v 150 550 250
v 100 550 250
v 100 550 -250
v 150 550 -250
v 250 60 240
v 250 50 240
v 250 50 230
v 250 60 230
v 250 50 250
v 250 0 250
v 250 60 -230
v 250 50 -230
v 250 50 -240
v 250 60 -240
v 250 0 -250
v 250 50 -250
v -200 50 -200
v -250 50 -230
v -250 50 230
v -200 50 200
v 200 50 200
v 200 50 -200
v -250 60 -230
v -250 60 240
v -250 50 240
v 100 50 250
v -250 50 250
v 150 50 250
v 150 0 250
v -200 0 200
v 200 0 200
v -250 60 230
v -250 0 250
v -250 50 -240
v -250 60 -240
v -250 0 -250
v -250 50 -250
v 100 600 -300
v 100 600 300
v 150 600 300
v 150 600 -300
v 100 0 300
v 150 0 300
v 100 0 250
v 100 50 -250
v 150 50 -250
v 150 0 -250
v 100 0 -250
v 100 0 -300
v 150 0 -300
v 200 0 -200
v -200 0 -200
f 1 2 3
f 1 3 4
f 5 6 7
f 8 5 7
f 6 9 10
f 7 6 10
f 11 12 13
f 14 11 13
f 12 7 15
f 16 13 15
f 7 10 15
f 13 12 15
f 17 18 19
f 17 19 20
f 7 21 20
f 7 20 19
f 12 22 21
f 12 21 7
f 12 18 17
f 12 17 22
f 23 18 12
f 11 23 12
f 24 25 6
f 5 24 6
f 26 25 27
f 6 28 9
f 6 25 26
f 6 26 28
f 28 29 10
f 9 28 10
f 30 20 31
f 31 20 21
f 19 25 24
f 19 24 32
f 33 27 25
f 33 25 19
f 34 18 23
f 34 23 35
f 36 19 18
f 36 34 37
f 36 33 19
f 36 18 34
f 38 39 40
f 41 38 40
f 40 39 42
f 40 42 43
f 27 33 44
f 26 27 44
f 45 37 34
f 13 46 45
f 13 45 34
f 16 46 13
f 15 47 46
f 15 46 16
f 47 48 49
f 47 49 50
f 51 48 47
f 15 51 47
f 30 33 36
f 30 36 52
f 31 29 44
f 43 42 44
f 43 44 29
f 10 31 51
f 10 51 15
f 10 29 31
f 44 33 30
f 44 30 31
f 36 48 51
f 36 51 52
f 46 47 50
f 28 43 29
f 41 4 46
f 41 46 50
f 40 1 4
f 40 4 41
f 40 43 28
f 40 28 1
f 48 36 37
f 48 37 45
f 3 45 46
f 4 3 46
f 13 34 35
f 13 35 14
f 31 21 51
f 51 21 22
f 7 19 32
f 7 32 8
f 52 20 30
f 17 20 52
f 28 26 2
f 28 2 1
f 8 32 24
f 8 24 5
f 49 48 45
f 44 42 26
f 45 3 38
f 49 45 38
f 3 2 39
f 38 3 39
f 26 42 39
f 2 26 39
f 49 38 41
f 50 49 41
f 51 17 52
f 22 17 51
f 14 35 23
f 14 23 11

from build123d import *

# Parameters (mm, degrees)
SKETCH2_W           = 500
SKETCH2_H           = 500
BOSS_EXTRUDE1_DEPTH = 50
SKETCH7_W           = 400
SKETCH7_H           = 400
CUT_EXTRUDE1_DEPTH  = 550
SKETCH8_W           = 500
SKETCH8_H           = 10
BOSS_EXTRUDE2_DEPTH = 10
SKETCH9_W           = 50
SKETCH9_H           = 50
BOSS_EXTRUDE3_DEPTH = 550
SKETCH10_W          = 50
SKETCH10_H          = 50
BOSS_EXTRUDE4_DEPTH = 600


with BuildPart() as part:
    # Sketch2 → Boss-Extrude1 (new body)
    with BuildSketch(Plane(origin=(0, 0, 0), x_dir=(1, 0, 0), z_dir=(0, 1, 0))):
        Rectangle(SKETCH2_W, SKETCH2_H)
    extrude(amount=BOSS_EXTRUDE1_DEPTH)

    # Sketch7 → Cut-Extrude1 (cut)
    with BuildSketch(Plane(origin=(0, 50, 0), x_dir=(1, 0, 0), z_dir=(0, 1, 0))):
        Rectangle(SKETCH7_W, SKETCH7_H)
    extrude(amount=-CUT_EXTRUDE1_DEPTH, mode=Mode.SUBTRACT)

    # Sketch8 → Boss-Extrude2 (add)
    with BuildSketch(Plane(origin=(0, 50, 0), x_dir=(1, 0, 0), z_dir=(0, 1, 0))):
        with Locations((0, 235)):
            Rectangle(SKETCH8_W, SKETCH8_H)
        with Locations((0, -235)):
            Rectangle(SKETCH8_W, SKETCH8_H)
    extrude(amount=BOSS_EXTRUDE2_DEPTH)

    # Sketch9 → Boss-Extrude3 (add)
    with BuildSketch(Plane.XZ):
        with Locations((125, -275)):
            Rectangle(SKETCH9_W, SKETCH9_H)
        with Locations((125, 275)):
            Rectangle(SKETCH9_W, SKETCH9_H)
    extrude(amount=-BOSS_EXTRUDE3_DEPTH)

    # Sketch10 → Boss-Extrude4 (add)
    with BuildSketch(Plane.XY.offset(300)):
        with Locations((125, 575)):
            Rectangle(SKETCH10_W, SKETCH10_H)
    extrude(amount=-BOSS_EXTRUDE4_DEPTH)


solid = part.part
